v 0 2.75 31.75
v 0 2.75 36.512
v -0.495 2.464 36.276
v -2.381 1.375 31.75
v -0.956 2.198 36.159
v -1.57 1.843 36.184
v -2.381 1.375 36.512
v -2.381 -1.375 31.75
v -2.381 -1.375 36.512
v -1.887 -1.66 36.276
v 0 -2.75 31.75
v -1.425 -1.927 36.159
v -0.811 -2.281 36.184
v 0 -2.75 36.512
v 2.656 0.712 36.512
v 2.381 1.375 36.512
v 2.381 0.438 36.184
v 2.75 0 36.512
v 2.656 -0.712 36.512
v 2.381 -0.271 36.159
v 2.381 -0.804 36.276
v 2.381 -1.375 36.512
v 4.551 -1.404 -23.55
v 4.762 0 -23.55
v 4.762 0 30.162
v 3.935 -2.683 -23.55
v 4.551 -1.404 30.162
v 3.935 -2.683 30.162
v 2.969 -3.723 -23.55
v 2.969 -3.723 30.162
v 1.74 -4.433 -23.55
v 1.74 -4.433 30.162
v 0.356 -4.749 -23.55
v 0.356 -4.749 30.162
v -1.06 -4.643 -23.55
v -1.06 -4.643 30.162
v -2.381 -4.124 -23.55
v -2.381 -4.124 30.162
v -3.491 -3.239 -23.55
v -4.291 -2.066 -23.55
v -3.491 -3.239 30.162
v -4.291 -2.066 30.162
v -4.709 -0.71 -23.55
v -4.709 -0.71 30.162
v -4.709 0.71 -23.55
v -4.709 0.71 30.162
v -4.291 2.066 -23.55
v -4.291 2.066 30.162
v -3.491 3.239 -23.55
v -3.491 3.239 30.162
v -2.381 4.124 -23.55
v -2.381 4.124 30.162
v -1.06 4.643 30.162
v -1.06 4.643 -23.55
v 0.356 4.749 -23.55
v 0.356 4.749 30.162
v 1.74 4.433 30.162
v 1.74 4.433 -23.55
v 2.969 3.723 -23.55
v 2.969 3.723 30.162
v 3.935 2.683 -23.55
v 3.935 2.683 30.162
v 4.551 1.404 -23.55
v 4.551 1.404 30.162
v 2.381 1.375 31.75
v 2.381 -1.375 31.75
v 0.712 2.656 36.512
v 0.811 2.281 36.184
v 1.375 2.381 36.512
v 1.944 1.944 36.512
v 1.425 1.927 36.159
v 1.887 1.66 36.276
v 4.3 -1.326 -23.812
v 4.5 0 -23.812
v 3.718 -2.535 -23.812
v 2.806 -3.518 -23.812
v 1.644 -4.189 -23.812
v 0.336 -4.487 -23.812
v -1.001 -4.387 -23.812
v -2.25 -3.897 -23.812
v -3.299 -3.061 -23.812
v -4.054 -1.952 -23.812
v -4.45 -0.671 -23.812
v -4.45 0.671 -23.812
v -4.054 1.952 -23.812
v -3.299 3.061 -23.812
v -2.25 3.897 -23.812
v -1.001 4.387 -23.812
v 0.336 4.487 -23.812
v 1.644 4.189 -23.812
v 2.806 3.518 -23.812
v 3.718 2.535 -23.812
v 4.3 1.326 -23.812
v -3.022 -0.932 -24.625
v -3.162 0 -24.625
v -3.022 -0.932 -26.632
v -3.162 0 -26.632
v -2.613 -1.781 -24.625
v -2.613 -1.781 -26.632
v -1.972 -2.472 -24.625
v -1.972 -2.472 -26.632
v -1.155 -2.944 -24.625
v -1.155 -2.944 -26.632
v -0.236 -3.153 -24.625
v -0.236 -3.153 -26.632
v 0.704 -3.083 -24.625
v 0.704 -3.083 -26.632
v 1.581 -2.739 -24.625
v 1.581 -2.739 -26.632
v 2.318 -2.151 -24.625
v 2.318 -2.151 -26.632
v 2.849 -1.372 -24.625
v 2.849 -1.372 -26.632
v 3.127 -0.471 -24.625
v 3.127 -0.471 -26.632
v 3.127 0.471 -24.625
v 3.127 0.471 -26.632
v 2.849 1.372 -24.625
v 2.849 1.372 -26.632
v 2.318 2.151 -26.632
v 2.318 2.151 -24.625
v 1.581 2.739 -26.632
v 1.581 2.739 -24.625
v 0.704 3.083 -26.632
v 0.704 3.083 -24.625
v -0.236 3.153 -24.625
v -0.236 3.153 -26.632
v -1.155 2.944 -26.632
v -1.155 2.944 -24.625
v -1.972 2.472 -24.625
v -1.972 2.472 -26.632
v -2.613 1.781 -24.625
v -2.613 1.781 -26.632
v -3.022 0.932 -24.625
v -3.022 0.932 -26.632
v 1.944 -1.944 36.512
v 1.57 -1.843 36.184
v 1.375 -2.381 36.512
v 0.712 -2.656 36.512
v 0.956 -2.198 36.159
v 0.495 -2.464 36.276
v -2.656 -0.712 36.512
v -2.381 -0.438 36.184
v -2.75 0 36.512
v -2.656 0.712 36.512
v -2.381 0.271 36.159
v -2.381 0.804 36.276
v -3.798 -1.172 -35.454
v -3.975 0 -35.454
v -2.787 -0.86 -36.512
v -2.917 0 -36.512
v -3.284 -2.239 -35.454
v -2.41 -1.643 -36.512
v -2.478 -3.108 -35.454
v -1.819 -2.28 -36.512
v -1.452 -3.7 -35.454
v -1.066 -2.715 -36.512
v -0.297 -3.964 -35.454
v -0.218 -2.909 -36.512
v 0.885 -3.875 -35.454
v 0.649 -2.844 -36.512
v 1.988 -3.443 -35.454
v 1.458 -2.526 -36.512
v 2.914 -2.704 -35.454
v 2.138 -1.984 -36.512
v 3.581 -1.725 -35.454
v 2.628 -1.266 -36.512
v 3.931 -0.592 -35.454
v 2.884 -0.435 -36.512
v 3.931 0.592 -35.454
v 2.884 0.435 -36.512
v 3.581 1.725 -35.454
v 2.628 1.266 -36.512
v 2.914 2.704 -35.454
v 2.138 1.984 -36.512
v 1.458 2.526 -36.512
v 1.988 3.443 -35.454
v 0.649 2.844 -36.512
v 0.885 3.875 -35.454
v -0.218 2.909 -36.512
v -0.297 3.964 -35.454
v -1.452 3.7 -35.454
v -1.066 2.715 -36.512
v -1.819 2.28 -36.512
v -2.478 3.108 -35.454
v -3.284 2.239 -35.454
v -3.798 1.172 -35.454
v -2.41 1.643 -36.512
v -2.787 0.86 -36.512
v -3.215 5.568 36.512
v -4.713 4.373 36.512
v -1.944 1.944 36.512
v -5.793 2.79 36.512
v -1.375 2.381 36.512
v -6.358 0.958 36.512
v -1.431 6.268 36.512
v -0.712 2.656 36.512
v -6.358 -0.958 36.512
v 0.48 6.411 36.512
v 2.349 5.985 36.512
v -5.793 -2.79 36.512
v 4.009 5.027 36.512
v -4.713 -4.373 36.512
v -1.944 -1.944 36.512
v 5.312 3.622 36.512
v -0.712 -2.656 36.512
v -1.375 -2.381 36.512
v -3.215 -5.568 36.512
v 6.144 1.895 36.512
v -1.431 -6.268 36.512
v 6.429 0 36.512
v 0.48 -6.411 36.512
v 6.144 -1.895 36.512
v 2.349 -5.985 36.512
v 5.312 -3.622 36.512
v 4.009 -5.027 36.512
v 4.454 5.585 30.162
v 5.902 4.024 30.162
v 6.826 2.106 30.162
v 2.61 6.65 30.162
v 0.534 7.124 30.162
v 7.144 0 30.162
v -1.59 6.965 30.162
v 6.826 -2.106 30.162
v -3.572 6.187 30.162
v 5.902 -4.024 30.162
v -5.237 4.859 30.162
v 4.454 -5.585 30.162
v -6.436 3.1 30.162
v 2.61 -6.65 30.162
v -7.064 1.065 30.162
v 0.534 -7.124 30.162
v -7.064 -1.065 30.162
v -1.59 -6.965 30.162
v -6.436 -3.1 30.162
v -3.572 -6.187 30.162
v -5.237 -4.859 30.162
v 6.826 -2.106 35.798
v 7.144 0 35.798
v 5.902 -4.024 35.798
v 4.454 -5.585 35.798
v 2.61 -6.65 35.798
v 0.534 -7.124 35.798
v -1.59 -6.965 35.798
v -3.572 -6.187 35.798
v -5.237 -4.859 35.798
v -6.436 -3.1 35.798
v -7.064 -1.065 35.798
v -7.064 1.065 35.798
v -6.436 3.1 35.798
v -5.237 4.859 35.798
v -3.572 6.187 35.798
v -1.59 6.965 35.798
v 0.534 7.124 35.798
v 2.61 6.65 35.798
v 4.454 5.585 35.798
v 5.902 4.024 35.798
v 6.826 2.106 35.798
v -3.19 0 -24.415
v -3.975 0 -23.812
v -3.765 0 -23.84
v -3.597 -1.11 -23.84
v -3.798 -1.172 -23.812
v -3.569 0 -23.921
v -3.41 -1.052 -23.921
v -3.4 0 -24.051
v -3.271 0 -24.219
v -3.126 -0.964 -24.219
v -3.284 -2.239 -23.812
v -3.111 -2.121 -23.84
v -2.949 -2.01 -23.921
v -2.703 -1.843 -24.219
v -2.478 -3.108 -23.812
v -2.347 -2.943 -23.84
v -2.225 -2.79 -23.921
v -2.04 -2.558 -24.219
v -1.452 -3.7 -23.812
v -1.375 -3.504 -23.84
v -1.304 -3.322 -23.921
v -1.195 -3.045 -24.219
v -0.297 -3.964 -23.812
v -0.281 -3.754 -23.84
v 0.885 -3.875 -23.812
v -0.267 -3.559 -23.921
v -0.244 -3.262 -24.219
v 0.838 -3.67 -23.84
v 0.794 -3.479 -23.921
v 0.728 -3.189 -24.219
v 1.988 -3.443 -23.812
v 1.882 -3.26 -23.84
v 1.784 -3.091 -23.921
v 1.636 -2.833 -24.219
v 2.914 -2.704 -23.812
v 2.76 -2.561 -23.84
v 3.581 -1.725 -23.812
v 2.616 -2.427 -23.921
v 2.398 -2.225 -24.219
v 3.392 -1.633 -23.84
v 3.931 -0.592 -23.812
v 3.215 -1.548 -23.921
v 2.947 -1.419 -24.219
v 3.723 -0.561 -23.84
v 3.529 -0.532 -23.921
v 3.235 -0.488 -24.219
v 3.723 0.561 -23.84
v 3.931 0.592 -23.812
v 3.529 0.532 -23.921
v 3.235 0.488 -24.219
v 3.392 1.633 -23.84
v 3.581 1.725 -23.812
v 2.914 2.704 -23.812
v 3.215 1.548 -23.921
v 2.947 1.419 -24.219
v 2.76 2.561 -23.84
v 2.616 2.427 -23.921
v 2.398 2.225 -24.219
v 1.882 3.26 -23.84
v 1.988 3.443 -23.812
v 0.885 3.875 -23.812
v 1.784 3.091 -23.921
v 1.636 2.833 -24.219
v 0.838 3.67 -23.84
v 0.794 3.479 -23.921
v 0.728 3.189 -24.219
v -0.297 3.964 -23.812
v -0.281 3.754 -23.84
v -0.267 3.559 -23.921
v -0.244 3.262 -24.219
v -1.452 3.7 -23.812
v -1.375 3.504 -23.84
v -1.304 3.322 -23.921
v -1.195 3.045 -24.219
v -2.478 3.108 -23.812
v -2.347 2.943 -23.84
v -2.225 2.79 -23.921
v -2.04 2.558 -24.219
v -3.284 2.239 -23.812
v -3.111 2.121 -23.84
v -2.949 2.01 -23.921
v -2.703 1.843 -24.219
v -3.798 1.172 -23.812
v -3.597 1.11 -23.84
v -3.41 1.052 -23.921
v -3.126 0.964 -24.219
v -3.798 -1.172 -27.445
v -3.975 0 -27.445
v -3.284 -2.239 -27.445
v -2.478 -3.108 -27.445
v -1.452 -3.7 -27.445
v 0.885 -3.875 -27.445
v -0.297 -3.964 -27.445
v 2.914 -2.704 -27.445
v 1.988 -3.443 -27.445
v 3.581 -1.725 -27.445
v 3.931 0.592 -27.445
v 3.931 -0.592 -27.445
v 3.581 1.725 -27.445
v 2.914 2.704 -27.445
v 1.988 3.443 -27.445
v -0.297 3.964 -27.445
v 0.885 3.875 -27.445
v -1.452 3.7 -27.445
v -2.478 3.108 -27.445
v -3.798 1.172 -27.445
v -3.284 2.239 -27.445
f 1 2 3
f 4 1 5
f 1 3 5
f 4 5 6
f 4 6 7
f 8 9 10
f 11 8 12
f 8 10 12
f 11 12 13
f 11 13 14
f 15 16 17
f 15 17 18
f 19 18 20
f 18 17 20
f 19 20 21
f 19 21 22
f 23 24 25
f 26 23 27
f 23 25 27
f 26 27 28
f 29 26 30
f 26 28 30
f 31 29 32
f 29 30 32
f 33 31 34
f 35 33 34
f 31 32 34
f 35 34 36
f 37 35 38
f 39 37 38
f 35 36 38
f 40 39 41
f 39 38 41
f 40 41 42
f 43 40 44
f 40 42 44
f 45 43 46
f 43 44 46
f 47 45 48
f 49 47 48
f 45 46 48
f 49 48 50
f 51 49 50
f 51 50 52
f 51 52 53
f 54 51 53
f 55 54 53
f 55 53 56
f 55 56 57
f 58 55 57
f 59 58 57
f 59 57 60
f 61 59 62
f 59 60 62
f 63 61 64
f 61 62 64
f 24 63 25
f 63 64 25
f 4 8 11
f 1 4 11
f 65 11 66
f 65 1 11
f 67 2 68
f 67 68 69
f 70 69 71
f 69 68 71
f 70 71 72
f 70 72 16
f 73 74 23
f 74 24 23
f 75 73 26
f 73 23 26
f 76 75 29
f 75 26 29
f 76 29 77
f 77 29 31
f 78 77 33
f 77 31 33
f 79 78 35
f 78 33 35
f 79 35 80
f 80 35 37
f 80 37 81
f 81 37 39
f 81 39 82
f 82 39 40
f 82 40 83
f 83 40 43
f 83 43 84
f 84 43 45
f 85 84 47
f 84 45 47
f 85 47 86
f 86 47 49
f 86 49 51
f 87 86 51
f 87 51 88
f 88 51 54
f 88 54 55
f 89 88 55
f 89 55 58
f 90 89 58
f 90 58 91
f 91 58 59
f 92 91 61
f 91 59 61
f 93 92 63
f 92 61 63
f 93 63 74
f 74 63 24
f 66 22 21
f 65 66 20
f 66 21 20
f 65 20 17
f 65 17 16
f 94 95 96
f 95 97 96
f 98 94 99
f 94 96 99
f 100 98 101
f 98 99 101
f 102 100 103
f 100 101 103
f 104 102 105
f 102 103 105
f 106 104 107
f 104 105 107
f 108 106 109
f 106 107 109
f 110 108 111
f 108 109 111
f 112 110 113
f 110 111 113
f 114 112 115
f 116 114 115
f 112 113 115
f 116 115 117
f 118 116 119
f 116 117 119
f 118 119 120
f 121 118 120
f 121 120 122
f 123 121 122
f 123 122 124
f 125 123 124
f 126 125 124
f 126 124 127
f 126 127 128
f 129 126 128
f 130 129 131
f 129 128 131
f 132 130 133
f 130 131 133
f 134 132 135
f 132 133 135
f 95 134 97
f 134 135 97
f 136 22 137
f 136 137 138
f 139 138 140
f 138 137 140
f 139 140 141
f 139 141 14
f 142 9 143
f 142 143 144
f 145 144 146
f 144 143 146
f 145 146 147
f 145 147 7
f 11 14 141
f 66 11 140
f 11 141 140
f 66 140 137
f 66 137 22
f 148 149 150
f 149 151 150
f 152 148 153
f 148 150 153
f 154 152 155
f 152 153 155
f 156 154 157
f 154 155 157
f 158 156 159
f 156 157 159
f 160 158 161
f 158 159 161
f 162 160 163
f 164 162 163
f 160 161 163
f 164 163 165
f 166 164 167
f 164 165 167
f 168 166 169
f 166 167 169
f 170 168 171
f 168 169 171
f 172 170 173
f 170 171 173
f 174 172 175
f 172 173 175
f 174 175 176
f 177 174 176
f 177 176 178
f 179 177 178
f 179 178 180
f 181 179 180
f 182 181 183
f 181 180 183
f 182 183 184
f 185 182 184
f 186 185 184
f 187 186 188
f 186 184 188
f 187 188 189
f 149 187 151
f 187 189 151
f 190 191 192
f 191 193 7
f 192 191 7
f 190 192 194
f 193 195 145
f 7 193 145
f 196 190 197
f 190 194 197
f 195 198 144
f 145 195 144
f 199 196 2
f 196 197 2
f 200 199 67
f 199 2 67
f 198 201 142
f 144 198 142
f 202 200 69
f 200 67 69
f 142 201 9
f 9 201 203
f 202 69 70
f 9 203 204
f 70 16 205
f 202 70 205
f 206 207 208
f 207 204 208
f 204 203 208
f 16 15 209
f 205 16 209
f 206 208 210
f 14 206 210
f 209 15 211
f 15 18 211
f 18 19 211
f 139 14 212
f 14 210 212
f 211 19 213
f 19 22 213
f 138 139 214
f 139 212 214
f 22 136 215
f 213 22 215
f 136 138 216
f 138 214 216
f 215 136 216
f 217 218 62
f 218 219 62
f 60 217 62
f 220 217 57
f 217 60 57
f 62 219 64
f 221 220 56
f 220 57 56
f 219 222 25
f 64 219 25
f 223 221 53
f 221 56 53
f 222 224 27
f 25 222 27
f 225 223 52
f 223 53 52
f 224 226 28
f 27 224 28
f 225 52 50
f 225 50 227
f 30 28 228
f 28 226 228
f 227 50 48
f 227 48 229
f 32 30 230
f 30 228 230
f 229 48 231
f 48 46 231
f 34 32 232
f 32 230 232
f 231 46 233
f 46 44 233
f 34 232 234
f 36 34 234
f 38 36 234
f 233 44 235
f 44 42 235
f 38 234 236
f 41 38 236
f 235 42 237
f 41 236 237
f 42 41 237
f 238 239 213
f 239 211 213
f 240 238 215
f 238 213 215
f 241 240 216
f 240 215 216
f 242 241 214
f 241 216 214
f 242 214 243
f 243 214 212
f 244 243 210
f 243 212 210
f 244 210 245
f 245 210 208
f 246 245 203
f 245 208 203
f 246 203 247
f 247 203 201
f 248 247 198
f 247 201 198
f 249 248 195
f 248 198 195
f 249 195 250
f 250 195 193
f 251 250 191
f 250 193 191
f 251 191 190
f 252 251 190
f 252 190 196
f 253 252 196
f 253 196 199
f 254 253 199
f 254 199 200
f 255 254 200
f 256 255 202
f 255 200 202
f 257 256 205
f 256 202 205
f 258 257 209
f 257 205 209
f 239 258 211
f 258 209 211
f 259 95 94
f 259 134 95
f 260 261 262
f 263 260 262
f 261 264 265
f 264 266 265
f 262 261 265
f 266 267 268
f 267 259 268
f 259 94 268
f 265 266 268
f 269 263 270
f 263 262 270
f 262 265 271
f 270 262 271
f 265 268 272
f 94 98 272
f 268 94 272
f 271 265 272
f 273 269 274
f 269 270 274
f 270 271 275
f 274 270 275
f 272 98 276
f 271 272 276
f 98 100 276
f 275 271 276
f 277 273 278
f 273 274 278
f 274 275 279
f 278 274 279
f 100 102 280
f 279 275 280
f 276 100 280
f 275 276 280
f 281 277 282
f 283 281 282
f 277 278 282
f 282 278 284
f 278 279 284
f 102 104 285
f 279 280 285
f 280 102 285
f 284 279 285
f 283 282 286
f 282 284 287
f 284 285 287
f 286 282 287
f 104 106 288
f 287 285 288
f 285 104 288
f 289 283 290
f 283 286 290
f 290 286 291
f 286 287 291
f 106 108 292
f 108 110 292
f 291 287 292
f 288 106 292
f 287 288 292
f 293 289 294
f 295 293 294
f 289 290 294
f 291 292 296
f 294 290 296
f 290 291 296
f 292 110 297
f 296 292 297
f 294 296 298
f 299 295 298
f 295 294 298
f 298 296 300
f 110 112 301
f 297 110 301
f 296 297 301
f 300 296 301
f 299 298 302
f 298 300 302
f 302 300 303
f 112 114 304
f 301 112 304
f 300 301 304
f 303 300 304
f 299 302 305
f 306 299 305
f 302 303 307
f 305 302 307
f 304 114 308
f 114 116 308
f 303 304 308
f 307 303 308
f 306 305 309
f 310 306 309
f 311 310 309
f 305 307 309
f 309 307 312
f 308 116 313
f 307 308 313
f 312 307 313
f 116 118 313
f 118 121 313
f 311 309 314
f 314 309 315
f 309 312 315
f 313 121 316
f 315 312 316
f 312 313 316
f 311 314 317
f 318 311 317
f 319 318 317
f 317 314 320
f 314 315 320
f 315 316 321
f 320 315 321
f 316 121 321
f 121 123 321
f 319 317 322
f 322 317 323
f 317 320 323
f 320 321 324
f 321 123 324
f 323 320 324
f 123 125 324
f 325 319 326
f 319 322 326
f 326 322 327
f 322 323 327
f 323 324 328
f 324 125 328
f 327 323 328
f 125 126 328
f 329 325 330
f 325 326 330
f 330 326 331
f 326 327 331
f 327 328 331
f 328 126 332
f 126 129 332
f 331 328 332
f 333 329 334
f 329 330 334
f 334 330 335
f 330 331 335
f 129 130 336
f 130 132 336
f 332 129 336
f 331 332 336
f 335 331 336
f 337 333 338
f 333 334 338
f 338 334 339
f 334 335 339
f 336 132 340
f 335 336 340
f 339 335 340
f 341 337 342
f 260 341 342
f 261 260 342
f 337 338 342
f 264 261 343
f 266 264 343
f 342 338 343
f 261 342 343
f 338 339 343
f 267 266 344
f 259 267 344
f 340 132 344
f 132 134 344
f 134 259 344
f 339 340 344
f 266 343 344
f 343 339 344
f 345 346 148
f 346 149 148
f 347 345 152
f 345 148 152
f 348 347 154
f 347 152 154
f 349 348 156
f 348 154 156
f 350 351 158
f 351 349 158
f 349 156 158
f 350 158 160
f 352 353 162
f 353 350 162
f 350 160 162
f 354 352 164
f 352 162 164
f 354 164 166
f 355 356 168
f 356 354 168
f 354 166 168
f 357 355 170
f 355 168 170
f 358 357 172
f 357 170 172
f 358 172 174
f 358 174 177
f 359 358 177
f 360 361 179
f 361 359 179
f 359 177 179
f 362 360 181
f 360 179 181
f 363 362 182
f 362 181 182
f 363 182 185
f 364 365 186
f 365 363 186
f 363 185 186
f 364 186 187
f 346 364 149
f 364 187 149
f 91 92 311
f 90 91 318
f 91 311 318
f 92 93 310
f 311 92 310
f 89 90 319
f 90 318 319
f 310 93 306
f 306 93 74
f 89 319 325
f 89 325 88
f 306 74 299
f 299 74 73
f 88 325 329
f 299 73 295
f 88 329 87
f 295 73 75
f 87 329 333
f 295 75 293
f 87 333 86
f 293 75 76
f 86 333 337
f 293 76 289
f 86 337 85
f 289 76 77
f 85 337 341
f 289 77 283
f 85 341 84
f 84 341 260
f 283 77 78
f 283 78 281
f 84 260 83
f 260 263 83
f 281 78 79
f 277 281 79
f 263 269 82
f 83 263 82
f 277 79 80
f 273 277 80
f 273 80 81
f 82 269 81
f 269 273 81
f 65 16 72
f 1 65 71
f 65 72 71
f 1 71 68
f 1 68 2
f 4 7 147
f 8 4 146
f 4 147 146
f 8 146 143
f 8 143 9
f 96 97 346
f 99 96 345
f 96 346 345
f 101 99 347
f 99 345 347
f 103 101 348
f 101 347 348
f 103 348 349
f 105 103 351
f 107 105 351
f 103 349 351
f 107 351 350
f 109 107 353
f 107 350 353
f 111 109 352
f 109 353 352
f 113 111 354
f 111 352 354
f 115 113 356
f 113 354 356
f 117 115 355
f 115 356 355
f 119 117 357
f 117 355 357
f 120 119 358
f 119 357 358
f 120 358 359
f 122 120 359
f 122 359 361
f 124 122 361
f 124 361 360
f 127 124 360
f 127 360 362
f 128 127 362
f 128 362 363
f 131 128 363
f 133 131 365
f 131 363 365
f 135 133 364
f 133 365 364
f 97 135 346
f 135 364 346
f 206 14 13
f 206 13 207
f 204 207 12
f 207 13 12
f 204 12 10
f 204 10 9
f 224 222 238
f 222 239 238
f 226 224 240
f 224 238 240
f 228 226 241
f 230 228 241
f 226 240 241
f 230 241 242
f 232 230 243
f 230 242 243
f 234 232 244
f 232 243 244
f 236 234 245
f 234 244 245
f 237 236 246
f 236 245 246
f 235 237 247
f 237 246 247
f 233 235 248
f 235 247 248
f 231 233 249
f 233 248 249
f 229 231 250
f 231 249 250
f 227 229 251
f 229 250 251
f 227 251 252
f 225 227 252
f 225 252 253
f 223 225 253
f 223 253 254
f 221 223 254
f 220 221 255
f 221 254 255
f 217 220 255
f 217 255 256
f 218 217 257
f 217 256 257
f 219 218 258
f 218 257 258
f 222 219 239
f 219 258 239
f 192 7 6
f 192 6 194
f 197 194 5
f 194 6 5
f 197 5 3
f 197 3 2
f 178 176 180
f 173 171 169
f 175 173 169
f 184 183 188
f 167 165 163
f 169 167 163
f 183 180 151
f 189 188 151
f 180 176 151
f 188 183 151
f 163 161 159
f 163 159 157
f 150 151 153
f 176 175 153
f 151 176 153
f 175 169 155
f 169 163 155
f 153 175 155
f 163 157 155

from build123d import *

# Parameters (mm, degrees)
CUT_EXTRUDE1_DEPTH = 4.7625


with BuildPart() as part:
    # Sketch4 → Revolve1 (revolve)
    with BuildSketch(Plane(origin=(0, 0, 0), x_dir=(0, 0, -1), z_dir=(1, 0, 0))):
        Polygon((-30.1625, 7.14375), (-35.798125, 7.14375), (-36.5125, 6.429375), (-36.5125, 0), (23.8125, 0), (23.8125, 4.500033333), (23.550033333, 4.7625), (-30.1625, 4.7625), align=None)
    revolve(axis=Axis((0, 0, 36.5125), (0, 0, -1)))

    # Sketch5 → Cut-Extrude1 (cut)
    with BuildSketch(Plane.XY.offset(36.5125)):
        Polygon((2.38125, 1.374815329), (0, 2.749630657), (-2.38125, 1.374815329), (-2.38125, -1.374815329), (0, -2.749630657), (2.38125, -1.374815329), align=None)
    extrude(amount=-CUT_EXTRUDE1_DEPTH, mode=Mode.SUBTRACT)

    # Cut-Extrude4 cone 1 section (through the dimple's axis) → Cut-Extrude4 (revolve, cut)
    with BuildSketch(Plane(origin=(0, 0, 36.5125), x_dir=(0, -1, 0), z_dir=(1, 0, 0))):
        Polygon((0, 0), (2.749630657, 0), (0, 2.749630657), align=None)
    revolve(axis=Axis((0, 0, 36.5125), (0, 0, -1)), mode=Mode.SUBTRACT)

    # Sketch7 → Revolve2 (revolve)
    with BuildSketch(Plane(origin=(0, 0, 0), x_dir=(0, 0, -1), z_dir=(1, 0, 0))):
        Polygon((23.8125, 3.9751), (35.454166667, 3.9751), (36.5125, 2.916766667), (36.5125, 0), (23.8125, 0), align=None)
    revolve(axis=Axis((0, 0, -36.5125), (0, 0, 1)))

    # Sketch10 → Cut-Revolve1 (revolve, cut)
    with BuildSketch(Plane(origin=(0, 0, 0), x_dir=(0, 0, -1), z_dir=(1, 0, 0))):
        with BuildLine():
            Line((24.6253, 3.1623), (26.6319, 3.1623))
            Line((26.6319, 3.1623), (28.2321, 4.7625))
            Line((28.2321, 4.7625), (23.8125, 4.7625))
            Line((23.8125, 4.7625), (23.8125, 3.9751))
            ThreePointArc((23.8125, 3.9751), (24.050563608, 3.400363608), (24.6253, 3.1623))
        make_face()
    revolve(axis=Axis((0, 0, -36.5125), (0, 0, 1)), mode=Mode.SUBTRACT)


solid = part.part
